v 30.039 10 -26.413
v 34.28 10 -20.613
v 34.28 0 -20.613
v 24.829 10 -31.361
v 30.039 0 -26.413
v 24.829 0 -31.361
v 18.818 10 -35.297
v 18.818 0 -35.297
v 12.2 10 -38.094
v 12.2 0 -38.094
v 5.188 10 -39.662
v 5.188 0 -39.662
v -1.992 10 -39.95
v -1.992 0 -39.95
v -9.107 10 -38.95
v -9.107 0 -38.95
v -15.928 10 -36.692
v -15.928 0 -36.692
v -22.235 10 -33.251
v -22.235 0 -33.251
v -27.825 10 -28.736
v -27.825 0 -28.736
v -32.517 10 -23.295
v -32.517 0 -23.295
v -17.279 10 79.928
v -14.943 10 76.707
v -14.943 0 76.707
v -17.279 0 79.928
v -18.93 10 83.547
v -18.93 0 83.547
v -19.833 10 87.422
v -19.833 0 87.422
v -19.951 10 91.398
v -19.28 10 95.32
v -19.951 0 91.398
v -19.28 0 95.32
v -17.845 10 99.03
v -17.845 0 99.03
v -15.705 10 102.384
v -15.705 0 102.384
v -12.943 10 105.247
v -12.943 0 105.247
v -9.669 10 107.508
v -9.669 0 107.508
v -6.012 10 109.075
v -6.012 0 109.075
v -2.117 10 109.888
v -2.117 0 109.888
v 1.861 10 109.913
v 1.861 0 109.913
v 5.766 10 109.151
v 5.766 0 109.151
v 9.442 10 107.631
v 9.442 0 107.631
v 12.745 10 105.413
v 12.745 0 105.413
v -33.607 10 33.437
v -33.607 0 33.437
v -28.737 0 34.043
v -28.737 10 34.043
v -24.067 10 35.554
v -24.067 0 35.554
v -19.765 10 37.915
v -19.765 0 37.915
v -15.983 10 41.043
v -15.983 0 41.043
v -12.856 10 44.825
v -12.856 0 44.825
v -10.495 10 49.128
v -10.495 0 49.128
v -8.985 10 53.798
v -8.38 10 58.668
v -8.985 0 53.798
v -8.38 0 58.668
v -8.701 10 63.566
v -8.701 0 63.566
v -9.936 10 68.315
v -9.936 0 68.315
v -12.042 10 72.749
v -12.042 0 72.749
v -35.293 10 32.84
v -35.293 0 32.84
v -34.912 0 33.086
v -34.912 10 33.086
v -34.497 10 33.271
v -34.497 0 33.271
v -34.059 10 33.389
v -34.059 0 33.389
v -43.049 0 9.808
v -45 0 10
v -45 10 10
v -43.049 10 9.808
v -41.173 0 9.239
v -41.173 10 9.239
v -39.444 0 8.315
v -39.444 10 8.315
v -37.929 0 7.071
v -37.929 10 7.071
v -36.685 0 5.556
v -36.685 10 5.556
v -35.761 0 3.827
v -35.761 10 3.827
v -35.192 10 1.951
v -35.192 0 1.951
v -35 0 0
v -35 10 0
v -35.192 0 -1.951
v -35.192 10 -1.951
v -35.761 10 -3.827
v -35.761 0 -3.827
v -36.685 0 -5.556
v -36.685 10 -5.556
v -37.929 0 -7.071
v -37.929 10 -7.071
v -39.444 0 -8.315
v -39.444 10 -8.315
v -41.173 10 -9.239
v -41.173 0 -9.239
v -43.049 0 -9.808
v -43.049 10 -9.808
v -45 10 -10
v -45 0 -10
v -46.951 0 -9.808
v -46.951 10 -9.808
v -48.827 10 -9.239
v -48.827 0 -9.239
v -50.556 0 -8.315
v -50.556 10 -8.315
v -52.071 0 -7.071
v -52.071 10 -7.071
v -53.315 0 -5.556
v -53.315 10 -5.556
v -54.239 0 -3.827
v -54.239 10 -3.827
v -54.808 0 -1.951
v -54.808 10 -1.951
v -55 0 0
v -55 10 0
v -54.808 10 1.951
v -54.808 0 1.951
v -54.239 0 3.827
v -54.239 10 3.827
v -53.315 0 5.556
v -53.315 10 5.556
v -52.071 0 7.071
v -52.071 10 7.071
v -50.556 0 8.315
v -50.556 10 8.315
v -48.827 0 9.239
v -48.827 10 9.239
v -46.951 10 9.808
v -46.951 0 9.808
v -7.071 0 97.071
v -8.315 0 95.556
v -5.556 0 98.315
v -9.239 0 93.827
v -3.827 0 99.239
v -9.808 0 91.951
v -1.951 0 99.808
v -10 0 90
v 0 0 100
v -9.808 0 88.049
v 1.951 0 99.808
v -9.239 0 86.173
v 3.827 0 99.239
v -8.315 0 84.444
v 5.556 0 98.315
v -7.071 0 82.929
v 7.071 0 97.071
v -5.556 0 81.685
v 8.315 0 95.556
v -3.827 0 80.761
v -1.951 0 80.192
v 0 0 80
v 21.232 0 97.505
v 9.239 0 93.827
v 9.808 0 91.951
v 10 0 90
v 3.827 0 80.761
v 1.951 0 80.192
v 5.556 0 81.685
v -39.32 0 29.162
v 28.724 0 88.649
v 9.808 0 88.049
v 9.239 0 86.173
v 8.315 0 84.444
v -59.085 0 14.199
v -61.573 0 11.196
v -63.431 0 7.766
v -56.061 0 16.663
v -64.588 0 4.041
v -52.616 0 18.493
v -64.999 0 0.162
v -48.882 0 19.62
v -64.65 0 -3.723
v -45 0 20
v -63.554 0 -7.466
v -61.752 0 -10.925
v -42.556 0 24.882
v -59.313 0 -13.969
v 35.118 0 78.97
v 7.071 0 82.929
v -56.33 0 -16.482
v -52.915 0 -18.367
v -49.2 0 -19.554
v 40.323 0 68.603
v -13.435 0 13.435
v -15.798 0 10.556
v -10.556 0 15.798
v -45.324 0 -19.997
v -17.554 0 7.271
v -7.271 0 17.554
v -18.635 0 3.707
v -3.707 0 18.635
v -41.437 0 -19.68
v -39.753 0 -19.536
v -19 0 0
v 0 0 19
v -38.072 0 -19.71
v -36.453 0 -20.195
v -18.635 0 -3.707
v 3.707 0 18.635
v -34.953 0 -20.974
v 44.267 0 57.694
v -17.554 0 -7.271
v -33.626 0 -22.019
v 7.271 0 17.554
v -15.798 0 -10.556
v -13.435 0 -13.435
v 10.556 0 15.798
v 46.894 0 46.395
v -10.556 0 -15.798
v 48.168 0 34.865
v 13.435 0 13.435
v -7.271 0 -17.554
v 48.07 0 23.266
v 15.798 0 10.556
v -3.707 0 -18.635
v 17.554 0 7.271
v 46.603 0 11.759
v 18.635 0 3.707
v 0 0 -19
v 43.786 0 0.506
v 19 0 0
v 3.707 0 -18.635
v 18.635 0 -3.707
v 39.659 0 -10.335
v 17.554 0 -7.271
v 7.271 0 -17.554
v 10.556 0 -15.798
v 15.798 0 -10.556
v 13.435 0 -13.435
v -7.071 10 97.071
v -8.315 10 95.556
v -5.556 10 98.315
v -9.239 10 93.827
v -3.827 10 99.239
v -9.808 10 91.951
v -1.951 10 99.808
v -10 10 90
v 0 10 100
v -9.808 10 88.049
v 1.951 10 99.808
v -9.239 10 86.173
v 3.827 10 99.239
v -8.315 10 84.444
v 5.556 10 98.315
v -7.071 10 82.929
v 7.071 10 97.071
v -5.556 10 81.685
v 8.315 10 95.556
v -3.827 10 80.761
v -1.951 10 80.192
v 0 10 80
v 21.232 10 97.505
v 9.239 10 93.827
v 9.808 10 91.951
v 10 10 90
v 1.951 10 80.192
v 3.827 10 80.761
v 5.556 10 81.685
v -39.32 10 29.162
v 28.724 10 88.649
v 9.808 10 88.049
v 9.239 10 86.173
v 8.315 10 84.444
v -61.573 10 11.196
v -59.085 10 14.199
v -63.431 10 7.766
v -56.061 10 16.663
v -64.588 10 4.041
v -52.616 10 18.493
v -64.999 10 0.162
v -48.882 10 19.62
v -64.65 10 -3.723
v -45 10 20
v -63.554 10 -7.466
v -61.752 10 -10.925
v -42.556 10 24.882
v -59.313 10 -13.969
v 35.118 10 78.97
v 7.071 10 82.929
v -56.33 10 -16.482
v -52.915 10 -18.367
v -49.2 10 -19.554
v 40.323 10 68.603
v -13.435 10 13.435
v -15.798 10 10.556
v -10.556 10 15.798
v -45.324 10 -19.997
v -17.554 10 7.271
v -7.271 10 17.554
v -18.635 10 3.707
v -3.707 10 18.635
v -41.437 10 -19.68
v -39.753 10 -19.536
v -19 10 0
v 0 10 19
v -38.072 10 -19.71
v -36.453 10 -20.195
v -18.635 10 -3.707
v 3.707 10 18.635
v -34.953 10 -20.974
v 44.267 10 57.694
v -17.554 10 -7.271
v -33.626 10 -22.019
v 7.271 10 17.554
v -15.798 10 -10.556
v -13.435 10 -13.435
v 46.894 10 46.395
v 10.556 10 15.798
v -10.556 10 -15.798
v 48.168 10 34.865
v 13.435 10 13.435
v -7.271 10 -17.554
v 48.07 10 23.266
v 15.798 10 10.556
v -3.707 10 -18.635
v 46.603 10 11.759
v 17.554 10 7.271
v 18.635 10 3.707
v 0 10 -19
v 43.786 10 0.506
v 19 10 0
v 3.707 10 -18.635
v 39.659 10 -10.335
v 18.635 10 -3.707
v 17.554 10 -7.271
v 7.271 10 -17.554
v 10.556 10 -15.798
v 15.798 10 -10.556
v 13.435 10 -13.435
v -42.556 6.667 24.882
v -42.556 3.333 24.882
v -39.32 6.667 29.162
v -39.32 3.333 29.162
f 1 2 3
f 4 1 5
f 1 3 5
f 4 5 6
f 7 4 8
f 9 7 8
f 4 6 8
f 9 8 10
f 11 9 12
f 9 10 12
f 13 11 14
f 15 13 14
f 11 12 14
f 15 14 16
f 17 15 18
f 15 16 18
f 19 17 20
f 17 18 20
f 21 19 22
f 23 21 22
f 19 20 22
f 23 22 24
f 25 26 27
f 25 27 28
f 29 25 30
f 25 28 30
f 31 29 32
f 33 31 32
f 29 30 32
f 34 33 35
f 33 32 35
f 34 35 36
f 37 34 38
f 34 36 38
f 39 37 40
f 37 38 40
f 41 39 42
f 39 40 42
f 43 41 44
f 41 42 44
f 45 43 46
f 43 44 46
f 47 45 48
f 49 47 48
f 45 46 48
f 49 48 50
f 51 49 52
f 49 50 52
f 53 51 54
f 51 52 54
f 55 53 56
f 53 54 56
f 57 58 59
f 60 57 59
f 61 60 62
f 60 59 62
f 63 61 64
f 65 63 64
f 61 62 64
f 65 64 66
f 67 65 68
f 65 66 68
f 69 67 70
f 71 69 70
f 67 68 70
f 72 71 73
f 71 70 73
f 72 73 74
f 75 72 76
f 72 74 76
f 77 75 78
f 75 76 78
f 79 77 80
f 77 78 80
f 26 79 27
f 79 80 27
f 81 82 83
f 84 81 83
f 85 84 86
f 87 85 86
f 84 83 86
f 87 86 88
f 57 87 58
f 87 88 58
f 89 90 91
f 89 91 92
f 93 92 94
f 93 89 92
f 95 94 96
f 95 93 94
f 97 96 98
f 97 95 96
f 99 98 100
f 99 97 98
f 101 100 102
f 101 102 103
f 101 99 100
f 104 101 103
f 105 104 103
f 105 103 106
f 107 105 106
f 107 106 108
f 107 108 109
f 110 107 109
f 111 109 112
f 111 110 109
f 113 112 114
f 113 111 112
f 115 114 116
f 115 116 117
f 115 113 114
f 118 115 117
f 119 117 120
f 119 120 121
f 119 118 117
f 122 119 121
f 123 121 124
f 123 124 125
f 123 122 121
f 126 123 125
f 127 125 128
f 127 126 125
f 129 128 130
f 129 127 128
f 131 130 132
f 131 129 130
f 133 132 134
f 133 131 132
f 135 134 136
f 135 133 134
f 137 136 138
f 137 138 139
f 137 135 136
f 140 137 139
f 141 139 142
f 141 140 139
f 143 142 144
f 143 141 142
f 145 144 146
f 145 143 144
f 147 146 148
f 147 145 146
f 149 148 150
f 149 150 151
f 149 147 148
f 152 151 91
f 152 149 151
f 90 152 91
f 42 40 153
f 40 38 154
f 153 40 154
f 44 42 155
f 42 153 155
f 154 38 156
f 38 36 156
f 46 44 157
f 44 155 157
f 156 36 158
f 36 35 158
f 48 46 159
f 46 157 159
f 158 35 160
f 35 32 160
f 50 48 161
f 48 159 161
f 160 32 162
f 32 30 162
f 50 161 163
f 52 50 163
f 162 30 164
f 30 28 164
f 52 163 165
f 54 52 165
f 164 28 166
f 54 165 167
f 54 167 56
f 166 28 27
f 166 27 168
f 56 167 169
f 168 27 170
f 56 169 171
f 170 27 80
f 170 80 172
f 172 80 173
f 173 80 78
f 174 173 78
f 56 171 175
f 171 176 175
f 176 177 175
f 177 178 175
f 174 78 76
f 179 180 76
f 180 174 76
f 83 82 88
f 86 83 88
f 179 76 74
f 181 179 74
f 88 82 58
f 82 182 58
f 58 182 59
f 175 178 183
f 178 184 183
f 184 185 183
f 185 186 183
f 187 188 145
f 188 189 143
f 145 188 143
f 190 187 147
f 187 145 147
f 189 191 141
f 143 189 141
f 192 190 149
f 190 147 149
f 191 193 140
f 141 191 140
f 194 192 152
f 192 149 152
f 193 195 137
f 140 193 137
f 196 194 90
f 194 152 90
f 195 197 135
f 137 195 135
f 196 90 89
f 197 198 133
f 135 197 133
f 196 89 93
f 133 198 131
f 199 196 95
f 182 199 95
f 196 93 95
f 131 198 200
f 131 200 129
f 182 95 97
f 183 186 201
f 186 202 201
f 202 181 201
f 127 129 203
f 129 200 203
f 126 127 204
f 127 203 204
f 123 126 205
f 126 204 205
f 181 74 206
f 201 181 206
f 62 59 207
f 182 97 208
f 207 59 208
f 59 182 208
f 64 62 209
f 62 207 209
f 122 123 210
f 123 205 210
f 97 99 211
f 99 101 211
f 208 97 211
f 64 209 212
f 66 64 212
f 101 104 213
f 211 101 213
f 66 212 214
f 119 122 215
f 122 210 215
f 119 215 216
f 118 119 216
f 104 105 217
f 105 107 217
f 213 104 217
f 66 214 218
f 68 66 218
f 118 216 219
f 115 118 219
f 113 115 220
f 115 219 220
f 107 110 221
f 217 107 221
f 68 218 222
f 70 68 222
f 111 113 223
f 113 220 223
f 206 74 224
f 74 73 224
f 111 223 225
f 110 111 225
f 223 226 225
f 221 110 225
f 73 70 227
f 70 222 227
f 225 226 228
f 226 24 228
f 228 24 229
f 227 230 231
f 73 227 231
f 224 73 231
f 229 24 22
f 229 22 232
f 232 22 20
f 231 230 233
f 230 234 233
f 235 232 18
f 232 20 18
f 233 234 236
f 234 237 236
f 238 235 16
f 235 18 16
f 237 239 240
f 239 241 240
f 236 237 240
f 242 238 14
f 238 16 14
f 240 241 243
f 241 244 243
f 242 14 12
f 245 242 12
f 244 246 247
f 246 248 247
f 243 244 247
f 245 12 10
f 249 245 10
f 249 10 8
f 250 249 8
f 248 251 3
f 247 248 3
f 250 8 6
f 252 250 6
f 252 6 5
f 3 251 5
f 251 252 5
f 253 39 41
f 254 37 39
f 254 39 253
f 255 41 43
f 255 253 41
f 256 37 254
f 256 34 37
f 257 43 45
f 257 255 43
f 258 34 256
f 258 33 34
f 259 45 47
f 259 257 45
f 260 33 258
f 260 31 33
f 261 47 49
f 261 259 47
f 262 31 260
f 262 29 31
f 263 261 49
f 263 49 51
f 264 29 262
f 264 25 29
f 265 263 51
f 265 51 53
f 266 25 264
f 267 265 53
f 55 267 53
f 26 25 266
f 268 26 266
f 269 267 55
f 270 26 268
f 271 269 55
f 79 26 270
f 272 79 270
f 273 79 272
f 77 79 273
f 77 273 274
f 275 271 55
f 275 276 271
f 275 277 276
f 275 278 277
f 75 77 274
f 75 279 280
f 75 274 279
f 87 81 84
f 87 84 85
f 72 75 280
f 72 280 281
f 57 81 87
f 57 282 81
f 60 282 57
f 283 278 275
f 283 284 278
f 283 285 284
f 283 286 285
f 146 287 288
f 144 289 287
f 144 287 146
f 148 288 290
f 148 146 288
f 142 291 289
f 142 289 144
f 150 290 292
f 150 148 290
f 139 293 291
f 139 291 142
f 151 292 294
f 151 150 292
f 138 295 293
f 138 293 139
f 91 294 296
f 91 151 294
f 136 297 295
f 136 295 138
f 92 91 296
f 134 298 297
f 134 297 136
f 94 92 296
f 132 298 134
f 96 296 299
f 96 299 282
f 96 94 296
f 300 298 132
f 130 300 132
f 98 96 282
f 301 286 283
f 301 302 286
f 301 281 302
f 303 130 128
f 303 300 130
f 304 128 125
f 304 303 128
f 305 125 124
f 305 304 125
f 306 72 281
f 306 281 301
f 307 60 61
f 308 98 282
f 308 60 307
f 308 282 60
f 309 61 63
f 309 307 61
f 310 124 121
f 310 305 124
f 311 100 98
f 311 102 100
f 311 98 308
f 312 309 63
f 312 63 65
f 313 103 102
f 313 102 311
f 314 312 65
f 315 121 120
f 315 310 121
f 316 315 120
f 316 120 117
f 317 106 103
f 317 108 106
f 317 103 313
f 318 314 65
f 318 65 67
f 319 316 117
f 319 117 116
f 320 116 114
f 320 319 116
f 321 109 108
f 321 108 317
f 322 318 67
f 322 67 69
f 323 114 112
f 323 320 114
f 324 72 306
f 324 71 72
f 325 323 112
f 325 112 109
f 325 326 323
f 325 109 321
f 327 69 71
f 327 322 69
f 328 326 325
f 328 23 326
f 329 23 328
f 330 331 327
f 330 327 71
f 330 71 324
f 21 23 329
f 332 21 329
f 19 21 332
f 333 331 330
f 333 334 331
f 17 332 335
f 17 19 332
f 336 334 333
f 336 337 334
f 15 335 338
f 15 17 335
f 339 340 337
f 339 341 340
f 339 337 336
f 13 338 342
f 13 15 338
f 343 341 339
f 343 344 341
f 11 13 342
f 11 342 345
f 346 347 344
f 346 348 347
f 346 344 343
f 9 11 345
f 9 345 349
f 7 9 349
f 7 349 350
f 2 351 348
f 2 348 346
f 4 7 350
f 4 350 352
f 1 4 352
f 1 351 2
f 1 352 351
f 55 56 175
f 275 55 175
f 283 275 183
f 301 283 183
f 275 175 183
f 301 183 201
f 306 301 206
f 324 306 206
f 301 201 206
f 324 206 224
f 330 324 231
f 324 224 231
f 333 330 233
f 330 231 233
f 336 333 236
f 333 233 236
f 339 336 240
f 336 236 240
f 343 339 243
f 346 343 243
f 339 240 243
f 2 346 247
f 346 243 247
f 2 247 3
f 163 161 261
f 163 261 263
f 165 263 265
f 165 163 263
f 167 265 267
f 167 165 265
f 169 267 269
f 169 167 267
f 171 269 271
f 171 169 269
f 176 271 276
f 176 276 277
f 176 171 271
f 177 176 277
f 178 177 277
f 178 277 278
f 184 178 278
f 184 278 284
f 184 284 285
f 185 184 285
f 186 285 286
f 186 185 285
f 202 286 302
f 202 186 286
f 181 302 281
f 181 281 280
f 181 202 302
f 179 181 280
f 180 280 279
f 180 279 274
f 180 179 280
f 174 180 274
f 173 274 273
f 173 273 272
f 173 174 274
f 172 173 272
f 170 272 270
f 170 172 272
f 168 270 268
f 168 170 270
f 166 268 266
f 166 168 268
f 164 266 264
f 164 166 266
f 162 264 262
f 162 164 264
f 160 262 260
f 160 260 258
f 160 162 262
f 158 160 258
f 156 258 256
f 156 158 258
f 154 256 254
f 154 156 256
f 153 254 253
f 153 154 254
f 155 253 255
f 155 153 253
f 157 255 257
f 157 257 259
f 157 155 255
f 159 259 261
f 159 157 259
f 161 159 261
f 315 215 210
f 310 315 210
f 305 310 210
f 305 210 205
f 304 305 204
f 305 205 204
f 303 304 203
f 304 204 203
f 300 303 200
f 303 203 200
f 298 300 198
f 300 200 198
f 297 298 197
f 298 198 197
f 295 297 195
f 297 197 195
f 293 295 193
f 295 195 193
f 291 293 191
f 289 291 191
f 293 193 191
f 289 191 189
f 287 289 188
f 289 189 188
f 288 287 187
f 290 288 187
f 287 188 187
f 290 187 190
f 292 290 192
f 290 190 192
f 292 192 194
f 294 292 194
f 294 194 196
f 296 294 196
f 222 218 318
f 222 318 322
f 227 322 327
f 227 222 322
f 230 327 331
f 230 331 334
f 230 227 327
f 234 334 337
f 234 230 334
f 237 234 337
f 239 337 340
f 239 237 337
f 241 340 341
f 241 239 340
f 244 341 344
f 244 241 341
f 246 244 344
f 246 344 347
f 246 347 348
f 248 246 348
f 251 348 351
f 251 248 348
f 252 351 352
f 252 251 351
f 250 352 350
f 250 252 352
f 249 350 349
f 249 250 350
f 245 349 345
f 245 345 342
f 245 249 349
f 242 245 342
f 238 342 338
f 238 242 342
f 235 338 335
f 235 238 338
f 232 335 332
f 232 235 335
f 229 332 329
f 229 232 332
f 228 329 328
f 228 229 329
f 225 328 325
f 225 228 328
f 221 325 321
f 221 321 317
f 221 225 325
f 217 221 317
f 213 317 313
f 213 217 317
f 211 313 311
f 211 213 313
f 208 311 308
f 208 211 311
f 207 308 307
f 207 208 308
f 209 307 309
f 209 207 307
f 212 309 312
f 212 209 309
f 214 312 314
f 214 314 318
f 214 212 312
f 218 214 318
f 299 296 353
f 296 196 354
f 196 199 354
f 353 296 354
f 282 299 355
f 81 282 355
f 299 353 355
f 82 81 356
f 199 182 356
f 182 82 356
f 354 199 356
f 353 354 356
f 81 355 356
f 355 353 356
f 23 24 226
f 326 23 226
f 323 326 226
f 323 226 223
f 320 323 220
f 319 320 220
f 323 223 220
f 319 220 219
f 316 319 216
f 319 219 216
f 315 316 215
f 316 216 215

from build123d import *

# Parameters (mm, degrees)
SKETCH1_R           = 19
SKETCH1_R_2         = 10
BOSS_EXTRUDE1_DEPTH = 10


with BuildPart() as part:
    # Sketch1 → Boss-Extrude1 (new body)
    with BuildSketch(Plane(origin=(0, 0, 0), x_dir=(1, 0, 0), z_dir=(0, 1, 0))):
        with BuildLine():
            ThreePointArc((-41.436781609, 19.680027304), (-64.91984621, 1.788778062), (-45, -20))
            add(Edge.make_bspline(
                [(-45, -20), (-42.951295687, -25.183418909), (-39.715623944, -29.46325745), (-35.29298477, -32.839515621)],
                knots=[0, 0, 0, 0, 0.944416844, 0.944416844, 0.944416844, 0.944416844], degree=3))
            ThreePointArc((-35.29298477, -32.839515621), (-34.497009223, -33.27058744), (-33.607245283, -33.437081025))
            ThreePointArc((-33.607245283, -33.437081025), (-10.495230645, -49.128111854), (-14.943027733, -76.70692202))
            ThreePointArc((-14.943027733, -76.70692202), (-14.395104128, -103.884558947), (12.745045372, -105.413105413))
            ThreePointArc((12.745045372, -105.413105413), (46.894193375, -46.39540437), (34.279777206, 20.61302682))
            ThreePointArc((34.279777206, 20.61302682), (1.604592709, 39.96780307), (-32.517006803, 23.294726197))
            ThreePointArc((-32.517006803, 23.294726197), (-36.453132672, 20.194921951), (-41.436781609, 19.680027304))
        make_face()
        with Locations(Location((0, 0, 0), (0, 0, 270))):
            Circle(SKETCH1_R, mode=Mode.SUBTRACT)
        with Locations(Location((-45, 0, 0), (0, 0, 270))):
            Circle(SKETCH1_R_2, mode=Mode.SUBTRACT)
        with Locations(Location((0, -90, 0), (0, 0, 270))):
            Circle(SKETCH1_R_2, mode=Mode.SUBTRACT)
    extrude(amount=BOSS_EXTRUDE1_DEPTH)


solid = part.part
